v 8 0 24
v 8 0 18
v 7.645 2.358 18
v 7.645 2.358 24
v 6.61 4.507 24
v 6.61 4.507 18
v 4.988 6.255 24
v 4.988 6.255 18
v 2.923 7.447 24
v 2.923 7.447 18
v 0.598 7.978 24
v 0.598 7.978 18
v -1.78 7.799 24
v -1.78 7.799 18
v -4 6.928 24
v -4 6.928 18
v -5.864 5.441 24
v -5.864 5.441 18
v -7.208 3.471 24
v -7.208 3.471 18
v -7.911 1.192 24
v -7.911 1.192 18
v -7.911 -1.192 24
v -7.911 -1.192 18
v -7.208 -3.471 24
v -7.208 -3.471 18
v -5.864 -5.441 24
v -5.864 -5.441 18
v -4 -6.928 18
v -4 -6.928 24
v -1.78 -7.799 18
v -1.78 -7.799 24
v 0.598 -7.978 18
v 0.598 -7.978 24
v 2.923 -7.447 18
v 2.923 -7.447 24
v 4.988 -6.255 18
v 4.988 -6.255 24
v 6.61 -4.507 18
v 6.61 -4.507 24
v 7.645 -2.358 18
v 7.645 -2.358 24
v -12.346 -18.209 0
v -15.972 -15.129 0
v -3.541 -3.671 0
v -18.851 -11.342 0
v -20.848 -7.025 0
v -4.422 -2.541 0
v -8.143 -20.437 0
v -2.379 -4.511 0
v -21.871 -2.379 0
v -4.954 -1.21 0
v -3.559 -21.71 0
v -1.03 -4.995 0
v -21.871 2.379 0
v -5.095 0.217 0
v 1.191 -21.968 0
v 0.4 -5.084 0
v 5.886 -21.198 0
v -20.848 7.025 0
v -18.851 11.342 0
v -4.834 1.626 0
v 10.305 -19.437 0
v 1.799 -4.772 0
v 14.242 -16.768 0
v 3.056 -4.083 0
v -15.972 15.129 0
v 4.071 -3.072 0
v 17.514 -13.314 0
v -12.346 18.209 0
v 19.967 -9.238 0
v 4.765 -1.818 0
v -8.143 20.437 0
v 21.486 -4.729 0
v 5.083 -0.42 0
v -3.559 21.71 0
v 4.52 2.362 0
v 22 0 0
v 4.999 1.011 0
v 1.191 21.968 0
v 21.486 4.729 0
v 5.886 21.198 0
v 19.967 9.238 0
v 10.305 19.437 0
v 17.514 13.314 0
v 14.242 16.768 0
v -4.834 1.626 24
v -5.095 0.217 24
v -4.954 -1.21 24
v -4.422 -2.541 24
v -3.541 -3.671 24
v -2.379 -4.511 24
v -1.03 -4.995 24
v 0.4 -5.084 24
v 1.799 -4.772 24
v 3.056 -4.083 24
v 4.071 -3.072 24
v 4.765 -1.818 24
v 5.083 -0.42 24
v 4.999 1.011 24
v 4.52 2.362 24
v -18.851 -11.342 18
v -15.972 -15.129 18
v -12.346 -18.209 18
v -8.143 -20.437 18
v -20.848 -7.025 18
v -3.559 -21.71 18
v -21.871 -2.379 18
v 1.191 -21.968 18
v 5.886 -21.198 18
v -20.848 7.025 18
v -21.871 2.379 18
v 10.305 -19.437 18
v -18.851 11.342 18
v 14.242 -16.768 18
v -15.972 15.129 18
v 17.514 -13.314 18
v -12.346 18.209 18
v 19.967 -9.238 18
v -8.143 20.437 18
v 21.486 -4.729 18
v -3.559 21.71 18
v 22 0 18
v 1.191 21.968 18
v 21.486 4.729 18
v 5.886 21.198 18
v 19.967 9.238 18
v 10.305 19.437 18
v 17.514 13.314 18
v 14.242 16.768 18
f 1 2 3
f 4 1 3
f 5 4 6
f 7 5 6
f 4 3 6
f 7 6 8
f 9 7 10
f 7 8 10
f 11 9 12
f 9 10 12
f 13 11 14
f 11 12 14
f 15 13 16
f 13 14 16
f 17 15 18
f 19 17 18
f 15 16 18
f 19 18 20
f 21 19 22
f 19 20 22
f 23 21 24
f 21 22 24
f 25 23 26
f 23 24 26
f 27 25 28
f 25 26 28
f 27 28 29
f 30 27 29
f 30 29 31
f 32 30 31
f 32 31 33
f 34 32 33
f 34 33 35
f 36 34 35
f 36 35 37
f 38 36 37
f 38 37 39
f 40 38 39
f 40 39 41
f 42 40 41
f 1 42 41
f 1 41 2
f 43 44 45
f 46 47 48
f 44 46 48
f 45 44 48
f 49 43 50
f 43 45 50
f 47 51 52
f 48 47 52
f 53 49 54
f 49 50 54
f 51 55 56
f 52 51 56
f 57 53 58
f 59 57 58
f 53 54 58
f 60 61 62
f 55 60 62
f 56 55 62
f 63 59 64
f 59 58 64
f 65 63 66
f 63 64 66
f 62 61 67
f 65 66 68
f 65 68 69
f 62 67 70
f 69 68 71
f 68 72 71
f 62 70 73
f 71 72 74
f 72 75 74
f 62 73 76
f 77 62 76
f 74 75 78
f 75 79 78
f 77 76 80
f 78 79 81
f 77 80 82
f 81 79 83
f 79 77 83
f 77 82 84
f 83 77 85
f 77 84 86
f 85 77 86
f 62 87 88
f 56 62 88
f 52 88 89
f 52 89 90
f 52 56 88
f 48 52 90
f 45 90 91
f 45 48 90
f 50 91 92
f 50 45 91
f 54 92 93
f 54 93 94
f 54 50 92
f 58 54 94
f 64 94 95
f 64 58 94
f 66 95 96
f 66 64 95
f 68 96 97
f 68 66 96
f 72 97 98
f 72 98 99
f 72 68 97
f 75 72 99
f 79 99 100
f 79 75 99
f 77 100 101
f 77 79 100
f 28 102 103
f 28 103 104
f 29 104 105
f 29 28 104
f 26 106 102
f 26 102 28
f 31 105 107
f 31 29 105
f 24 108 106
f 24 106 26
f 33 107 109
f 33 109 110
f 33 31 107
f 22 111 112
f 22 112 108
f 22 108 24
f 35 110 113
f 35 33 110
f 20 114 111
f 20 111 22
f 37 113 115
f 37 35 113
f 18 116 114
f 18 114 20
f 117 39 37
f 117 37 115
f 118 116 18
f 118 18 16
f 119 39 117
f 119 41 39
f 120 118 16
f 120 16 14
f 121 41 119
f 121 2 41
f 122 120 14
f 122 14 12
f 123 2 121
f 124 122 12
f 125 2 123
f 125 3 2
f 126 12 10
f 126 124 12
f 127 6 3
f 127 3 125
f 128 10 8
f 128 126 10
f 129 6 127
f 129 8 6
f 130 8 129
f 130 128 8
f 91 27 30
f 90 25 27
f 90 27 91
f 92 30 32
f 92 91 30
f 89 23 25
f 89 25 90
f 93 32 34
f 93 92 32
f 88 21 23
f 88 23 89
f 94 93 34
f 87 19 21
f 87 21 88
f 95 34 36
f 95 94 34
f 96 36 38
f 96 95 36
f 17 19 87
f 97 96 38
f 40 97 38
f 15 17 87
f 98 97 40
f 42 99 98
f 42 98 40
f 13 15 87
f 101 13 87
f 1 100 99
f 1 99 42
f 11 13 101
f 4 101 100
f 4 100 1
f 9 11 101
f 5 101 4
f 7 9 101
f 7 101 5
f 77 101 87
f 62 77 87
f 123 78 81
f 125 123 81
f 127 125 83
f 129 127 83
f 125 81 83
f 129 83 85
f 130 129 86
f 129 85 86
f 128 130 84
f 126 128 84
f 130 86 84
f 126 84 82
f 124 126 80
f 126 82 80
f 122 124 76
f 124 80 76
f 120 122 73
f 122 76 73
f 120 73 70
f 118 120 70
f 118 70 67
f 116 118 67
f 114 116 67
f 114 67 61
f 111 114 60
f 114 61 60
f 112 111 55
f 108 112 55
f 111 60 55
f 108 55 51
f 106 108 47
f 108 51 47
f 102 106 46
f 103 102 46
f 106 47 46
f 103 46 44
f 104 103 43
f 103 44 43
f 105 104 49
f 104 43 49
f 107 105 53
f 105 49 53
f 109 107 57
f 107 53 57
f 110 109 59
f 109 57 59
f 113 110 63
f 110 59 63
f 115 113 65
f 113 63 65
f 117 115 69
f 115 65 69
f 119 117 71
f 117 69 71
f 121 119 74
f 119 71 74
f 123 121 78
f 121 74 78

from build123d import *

# Parameters (mm, degrees)
SKETCH_1_R      = 8
EXTRUDE_1_DEPTH = 24
SKETCH_2_R      = 22
SKETCH_2_R_2    = 8
EXTRUDE_2_DEPTH = 18


with BuildPart() as part:
    # 草图1 → 凸台-拉伸1 (new body)
    with BuildSketch(Plane.XY):
        Circle(SKETCH_1_R)
        with BuildLine():
            Line((4.520101179, 2.361924075), (-4.833937562, 1.62574526))
            ThreePointArc((-4.833937562, 1.62574526), (0.400141388, -5.084278402), (4.520101179, 2.361924075))
        make_face(mode=Mode.SUBTRACT)
    extrude(amount=EXTRUDE_1_DEPTH)

    # 草图2 → 凸台-拉伸2 (add)
    with BuildSketch(Plane.XY):
        Circle(SKETCH_2_R)
        Circle(SKETCH_2_R_2, mode=Mode.SUBTRACT)
    extrude(amount=EXTRUDE_2_DEPTH)


solid = part.part
